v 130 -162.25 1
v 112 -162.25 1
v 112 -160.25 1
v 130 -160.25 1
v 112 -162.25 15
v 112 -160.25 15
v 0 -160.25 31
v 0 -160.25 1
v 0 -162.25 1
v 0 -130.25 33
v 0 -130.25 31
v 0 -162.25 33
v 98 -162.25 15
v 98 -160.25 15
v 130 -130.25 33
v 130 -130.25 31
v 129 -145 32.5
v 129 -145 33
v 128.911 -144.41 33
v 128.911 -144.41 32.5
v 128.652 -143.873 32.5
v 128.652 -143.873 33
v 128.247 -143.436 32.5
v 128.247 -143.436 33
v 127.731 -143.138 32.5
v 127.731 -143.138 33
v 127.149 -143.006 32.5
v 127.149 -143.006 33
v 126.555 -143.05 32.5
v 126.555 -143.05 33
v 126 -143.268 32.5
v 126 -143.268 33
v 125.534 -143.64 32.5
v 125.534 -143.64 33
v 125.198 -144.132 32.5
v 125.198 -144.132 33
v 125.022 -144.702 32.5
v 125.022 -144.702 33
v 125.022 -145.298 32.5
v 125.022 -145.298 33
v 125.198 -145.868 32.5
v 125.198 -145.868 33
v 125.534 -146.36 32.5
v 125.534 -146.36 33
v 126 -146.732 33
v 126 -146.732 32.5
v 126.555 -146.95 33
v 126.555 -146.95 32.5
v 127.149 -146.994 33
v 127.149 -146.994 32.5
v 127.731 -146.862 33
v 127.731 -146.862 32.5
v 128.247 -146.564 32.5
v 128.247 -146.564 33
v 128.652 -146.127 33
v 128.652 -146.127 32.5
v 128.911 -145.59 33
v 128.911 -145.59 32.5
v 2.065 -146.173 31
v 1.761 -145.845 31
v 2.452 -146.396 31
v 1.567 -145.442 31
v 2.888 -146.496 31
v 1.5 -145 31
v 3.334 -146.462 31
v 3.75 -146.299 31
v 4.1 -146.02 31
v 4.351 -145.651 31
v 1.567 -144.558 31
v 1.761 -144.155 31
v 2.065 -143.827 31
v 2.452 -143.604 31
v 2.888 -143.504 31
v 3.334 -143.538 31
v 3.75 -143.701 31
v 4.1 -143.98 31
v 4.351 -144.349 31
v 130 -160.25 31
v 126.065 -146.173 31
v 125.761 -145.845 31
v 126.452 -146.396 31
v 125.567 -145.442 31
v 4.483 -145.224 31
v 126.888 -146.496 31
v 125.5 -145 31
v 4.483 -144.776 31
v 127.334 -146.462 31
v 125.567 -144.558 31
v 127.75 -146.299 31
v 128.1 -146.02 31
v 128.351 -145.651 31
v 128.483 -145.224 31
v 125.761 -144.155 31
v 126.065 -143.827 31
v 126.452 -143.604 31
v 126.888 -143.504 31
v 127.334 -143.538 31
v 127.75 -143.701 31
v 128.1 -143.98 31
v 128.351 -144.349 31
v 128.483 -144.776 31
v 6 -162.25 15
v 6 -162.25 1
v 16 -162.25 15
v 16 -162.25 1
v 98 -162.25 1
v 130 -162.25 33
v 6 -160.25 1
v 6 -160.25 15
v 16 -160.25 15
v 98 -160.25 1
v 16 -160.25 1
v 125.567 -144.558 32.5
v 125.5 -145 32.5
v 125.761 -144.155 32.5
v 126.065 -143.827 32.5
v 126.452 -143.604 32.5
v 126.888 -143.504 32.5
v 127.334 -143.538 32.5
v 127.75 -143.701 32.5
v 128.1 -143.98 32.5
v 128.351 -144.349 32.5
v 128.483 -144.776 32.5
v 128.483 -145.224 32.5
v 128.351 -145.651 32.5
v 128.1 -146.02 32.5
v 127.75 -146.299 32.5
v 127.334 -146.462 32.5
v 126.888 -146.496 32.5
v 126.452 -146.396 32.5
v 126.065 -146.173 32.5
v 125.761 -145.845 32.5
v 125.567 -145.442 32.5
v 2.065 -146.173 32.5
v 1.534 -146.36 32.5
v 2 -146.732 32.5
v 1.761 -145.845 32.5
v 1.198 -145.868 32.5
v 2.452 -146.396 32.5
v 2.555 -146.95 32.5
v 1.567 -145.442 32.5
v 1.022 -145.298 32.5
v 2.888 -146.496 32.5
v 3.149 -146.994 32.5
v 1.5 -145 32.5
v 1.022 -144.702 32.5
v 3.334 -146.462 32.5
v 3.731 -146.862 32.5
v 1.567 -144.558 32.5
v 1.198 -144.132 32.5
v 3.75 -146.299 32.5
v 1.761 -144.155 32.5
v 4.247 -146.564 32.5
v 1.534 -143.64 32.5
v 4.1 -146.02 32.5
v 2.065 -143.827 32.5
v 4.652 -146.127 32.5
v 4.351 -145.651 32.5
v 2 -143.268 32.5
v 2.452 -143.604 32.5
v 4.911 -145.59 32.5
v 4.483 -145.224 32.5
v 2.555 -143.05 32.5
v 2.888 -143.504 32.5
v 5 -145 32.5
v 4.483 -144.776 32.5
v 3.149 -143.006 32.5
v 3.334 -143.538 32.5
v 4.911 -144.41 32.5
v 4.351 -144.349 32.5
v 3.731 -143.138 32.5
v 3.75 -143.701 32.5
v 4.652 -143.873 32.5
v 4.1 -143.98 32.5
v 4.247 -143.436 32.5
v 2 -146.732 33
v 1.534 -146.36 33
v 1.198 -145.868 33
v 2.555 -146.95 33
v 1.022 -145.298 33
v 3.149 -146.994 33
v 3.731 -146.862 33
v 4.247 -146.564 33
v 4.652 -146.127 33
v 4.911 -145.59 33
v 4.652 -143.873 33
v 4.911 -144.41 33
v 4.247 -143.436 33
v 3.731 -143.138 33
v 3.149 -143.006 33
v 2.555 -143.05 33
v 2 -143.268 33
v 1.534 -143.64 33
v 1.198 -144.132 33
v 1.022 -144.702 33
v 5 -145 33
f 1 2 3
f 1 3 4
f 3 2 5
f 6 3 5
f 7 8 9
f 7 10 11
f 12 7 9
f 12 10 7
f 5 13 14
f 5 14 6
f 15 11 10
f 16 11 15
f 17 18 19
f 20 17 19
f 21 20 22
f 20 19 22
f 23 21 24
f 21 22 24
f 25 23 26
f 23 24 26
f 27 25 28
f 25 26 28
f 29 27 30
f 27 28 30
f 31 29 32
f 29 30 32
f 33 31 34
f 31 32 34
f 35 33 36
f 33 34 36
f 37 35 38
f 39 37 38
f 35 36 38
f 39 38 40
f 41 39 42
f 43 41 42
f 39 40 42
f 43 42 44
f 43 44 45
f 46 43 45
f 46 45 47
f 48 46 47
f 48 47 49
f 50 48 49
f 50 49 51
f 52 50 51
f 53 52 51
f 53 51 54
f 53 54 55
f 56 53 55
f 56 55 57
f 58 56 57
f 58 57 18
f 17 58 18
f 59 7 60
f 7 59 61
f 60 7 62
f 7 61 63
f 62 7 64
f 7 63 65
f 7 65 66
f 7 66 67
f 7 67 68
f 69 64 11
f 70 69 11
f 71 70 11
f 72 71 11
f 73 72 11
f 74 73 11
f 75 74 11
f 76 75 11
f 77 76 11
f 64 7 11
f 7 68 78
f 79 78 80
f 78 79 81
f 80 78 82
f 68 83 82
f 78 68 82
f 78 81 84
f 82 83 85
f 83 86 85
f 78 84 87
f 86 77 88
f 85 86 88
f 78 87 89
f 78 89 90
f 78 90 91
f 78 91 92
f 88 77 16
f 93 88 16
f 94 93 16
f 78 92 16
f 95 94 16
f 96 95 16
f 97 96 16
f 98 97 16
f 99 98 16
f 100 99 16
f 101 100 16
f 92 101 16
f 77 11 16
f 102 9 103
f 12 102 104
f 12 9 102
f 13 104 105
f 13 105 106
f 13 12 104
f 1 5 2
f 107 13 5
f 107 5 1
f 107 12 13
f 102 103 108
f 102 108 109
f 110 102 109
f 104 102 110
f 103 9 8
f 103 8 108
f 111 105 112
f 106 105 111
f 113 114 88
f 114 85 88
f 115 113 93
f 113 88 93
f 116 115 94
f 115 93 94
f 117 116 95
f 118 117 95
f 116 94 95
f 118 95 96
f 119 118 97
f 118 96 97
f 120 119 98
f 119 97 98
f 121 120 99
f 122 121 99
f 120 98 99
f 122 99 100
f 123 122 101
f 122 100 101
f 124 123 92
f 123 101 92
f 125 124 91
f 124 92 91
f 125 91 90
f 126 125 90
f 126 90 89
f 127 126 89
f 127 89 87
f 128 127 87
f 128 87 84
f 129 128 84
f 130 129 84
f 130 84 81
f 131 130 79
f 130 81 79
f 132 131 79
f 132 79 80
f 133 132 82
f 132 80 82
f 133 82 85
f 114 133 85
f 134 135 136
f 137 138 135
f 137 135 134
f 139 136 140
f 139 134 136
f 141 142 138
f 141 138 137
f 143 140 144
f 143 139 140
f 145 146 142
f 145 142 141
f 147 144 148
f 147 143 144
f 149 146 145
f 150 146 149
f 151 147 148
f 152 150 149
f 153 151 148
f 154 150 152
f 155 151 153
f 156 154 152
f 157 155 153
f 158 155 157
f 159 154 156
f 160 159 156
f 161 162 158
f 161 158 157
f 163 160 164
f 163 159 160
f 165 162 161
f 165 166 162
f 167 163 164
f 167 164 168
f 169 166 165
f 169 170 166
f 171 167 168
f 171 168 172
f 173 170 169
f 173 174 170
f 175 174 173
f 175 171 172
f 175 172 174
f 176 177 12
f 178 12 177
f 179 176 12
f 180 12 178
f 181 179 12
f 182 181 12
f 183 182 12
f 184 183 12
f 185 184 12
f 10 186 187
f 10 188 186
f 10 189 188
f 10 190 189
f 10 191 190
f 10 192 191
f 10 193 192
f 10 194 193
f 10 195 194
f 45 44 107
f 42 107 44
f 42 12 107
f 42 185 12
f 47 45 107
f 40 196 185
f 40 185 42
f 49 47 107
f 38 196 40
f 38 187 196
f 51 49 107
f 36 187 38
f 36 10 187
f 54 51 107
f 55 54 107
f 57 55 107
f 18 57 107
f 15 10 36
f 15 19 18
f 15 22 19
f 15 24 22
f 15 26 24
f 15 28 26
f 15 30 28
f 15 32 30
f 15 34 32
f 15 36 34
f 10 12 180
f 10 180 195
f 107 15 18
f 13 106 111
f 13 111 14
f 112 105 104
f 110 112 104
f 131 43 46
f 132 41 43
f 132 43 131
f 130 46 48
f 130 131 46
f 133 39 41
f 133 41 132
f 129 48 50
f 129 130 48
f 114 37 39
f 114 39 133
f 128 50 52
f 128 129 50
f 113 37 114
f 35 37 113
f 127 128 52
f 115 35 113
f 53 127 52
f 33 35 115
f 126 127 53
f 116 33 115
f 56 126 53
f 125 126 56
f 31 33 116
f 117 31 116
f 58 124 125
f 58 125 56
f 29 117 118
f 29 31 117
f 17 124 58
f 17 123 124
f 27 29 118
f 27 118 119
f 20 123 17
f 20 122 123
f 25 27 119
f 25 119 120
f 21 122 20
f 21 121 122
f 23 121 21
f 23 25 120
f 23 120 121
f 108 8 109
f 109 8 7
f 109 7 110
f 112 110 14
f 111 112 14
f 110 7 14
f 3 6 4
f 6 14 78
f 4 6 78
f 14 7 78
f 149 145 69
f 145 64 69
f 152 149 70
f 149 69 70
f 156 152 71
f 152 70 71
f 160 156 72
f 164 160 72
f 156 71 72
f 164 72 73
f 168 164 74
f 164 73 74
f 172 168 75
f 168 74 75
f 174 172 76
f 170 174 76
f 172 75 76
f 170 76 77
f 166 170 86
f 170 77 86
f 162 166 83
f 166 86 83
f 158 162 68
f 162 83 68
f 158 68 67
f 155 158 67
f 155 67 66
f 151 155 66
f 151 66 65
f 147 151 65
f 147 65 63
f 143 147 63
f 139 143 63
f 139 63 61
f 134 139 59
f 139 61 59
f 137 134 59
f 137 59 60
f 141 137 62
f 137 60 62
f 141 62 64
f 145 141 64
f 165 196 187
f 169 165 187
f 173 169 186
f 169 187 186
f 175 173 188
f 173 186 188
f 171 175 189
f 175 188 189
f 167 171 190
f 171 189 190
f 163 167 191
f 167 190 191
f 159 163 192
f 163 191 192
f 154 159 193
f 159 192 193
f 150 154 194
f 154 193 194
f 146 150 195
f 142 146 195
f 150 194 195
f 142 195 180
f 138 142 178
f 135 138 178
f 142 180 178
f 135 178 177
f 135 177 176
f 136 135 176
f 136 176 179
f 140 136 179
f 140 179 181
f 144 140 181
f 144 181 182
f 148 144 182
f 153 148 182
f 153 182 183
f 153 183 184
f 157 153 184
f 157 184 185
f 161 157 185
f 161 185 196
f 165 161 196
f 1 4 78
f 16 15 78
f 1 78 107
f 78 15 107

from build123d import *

# Parameters (mm, degrees)
SKETCH021_W         = 130
SKETCH021_H         = 32
PAD009_DEPTH        = 2
HOLE005_D           = 3
HOLE005_DEPTH       = 25
HOLE005_CBORE_D     = 4
HOLE005_CBORE_DEPTH = 0.5
SKETCH023_W         = 130
SKETCH023_H         = 2
PAD010_DEPTH        = 30
SKETCH024_W         = 10
SKETCH024_H         = 15
SKETCH024_W_2       = 14
POCKET004_DEPTH     = 5


with BuildPart() as part:
    # Sketch021 → Pad009 (new body)
    with BuildSketch(Plane.XY.offset(31)):
        with Locations((65, -146.25)):
            Rectangle(SKETCH021_W, SKETCH021_H)
    extrude(amount=PAD009_DEPTH)

    # Hole005
    with Locations(Plane.XY.offset(33)):
        with Locations((3, -145), (127, -145)):
            CounterBoreHole(HOLE005_D / 2, HOLE005_CBORE_D / 2, HOLE005_CBORE_DEPTH, depth=HOLE005_DEPTH)

    # Sketch023 (on Face4 of Hole005) → Pad010 (join)
    with BuildSketch(Plane(origin=(0, 0, 31), x_dir=(1, 0, 0), z_dir=(0, 0, -1))):
        with Locations((65, 161.25)):
            Rectangle(SKETCH023_W, SKETCH023_H)
    extrude(amount=PAD010_DEPTH)

    # Sketch024 (on Face14 of Pad010) → Pocket004 (cut)
    with BuildSketch(Plane.XZ.offset(162.25)):
        with Locations((11, 7.5)):
            Rectangle(SKETCH024_W, SKETCH024_H)
        with Locations((105, 7.5)):
            Rectangle(SKETCH024_W_2, SKETCH024_H)
    extrude(amount=-POCKET004_DEPTH, mode=Mode.SUBTRACT)


solid = part.part
